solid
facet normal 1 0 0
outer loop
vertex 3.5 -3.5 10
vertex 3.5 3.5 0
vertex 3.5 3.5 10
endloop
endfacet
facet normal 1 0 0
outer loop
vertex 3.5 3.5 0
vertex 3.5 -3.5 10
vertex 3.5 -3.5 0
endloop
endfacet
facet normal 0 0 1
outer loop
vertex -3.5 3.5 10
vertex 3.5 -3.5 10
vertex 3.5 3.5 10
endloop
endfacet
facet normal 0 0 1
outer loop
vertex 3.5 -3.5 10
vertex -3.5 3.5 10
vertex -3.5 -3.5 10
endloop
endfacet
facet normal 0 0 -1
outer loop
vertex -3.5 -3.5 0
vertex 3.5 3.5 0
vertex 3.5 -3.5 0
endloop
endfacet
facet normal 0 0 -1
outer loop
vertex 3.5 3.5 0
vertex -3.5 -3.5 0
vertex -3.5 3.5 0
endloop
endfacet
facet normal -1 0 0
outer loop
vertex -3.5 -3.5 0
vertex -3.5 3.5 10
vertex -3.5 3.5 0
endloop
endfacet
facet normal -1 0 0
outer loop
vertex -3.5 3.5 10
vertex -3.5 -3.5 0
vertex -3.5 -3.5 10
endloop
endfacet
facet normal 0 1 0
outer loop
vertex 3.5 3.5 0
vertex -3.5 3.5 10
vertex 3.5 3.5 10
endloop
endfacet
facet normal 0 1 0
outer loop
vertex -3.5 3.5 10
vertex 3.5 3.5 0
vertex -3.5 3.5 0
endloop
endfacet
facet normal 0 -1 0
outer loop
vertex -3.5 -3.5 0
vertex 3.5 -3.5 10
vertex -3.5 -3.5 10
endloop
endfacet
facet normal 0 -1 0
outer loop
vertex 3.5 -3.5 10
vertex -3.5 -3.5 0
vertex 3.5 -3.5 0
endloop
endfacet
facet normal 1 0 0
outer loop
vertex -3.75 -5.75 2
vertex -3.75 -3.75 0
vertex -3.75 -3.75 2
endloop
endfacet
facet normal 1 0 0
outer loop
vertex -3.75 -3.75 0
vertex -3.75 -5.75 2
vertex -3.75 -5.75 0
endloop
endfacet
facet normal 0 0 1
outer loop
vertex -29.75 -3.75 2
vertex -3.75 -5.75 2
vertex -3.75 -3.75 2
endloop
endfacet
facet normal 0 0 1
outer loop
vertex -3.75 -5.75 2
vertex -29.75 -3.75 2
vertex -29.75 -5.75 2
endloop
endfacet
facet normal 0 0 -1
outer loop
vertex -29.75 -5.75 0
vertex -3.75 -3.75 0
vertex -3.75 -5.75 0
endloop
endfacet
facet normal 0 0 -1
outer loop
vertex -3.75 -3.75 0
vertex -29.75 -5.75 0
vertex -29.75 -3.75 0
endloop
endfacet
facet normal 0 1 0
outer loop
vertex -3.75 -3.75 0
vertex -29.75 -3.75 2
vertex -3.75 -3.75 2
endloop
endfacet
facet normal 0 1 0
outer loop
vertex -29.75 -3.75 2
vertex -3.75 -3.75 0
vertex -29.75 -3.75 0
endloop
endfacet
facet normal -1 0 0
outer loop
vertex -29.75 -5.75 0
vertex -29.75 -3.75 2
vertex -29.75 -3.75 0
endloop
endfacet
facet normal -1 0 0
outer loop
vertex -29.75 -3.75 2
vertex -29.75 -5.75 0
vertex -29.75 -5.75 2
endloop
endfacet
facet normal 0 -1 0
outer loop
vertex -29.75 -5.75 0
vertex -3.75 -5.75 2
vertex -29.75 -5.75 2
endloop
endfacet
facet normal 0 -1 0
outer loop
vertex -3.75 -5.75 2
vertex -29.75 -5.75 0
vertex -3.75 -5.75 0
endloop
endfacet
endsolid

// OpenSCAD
translate([0, 0, 5]) color([0,1,0,0.9]) cube([7, 7, 10], center=true);
translate([-4.0, -4.0, 1]) color([1,0,0]) cube([0.5, 0.5, 2], center=true);
translate([-4.5, -4.0, 1]) color([1,0,0]) cube([0.5, 0.5, 2], center=true);
translate([-5.0, -4.0, 1]) color([1,0,0]) cube([0.5, 0.5, 2], center=true);
translate([-5.5, -4.0, 1]) color([1,0,0]) cube([0.5, 0.5, 2], center=true);
translate([-6.0, -4.0, 1]) color([1,0,0]) cube([0.5, 0.5, 2], center=true);
translate([-6.5, -4.0, 1]) color([1,0,0]) cube([0.5, 0.5, 2], center=true);
translate([-7.0, -4.0, 1]) color([1,0,0]) cube([0.5, 0.5, 2], center=true);
translate([-7.5, -4.0, 1]) color([1,0,0]) cube([0.5, 0.5, 2], center=true);
translate([-8.0, -4.0, 1]) color([1,0,0]) cube([0.5, 0.5, 2], center=true);
translate([-8.5, -4.0, 1]) color([1,0,0]) cube([0.5, 0.5, 2], center=true);
translate([-9.0, -4.0, 1]) color([1,0,0]) cube([0.5, 0.5, 2], center=true);
translate([-9.5, -4.0, 1]) color([1,0,0]) cube([0.5, 0.5, 2], center=true);
translate([-10.0, -4.0, 1]) color([1,0,0]) cube([0.5, 0.5, 2], center=true);
translate([-10.5, -4.0, 1]) color([1,0,0]) cube([0.5, 0.5, 2], center=true);
translate([-11.0, -4.0, 1]) color([1,0,0]) cube([0.5, 0.5, 2], center=true);
translate([-11.5, -4.0, 1]) color([1,0,0]) cube([0.5, 0.5, 2], center=true);
translate([-12.0, -4.0, 1]) color([1,0,0]) cube([0.5, 0.5, 2], center=true);
translate([-12.5, -4.0, 1]) color([1,0,0]) cube([0.5, 0.5, 2], center=true);
translate([-13.0, -4.0, 1]) color([1,0,0]) cube([0.5, 0.5, 2], center=true);
translate([-13.5, -4.0, 1]) color([1,0,0]) cube([0.5, 0.5, 2], center=true);
translate([-14.0, -4.0, 1]) color([1,0,0]) cube([0.5, 0.5, 2], center=true);
translate([-14.5, -4.0, 1]) color([1,0,0]) cube([0.5, 0.5, 2], center=true);
translate([-15.0, -4.0, 1]) color([1,0,0]) cube([0.5, 0.5, 2], center=true);
translate([-15.5, -4.0, 1]) color([1,0,0]) cube([0.5, 0.5, 2], center=true);
translate([-16.0, -4.0, 1]) color([1,0,0]) cube([0.5, 0.5, 2], center=true);
translate([-16.5, -4.0, 1]) color([1,0,0]) cube([0.5, 0.5, 2], center=true);
translate([-17.0, -4.0, 1]) color([1,0,0]) cube([0.5, 0.5, 2], center=true);
translate([-17.5, -4.0, 1]) color([1,0,0]) cube([0.5, 0.5, 2], center=true);
translate([-18.0, -4.0, 1]) color([1,0,0]) cube([0.5, 0.5, 2], center=true);
translate([-18.5, -4.0, 1]) color([1,0,0]) cube([0.5, 0.5, 2], center=true);
translate([-19.0, -4.0, 1]) color([1,0,0]) cube([0.5, 0.5, 2], center=true);
translate([-19.5, -4.0, 1]) color([1,0,0]) cube([0.5, 0.5, 2], center=true);
translate([-20.0, -4.0, 1]) color([1,0,0]) cube([0.5, 0.5, 2], center=true);
translate([-20.5, -4.0, 1]) color([1,0,0]) cube([0.5, 0.5, 2], center=true);
translate([-21.0, -4.0, 1]) color([1,0,0]) cube([0.5, 0.5, 2], center=true);
translate([-21.5, -4.0, 1]) color([1,0,0]) cube([0.5, 0.5, 2], center=true);
translate([-22.0, -4.0, 1]) color([1,0,0]) cube([0.5, 0.5, 2], center=true);
translate([-22.5, -4.0, 1]) color([1,0,0]) cube([0.5, 0.5, 2], center=true);
translate([-23.0, -4.0, 1]) color([1,0,0]) cube([0.5, 0.5, 2], center=true);
translate([-23.5, -4.0, 1]) color([1,0,0]) cube([0.5, 0.5, 2], center=true);
translate([-24.0, -4.0, 1]) color([1,0,0]) cube([0.5, 0.5, 2], center=true);
translate([-24.5, -4.0, 1]) color([1,0,0]) cube([0.5, 0.5, 2], center=true);
translate([-25.0, -4.0, 1]) color([1,0,0]) cube([0.5, 0.5, 2], center=true);
translate([-25.5, -4.0, 1]) color([1,0,0]) cube([0.5, 0.5, 2], center=true);
translate([-26.0, -4.0, 1]) color([1,0,0]) cube([0.5, 0.5, 2], center=true);
translate([-26.5, -4.0, 1]) color([1,0,0]) cube([0.5, 0.5, 2], center=true);
translate([-27.0, -4.0, 1]) color([1,0,0]) cube([0.5, 0.5, 2], center=true);
translate([-27.5, -4.0, 1]) color([1,0,0]) cube([0.5, 0.5, 2], center=true);
translate([-28.0, -4.0, 1]) color([1,0,0]) cube([0.5, 0.5, 2], center=true);
translate([-28.5, -4.0, 1]) color([1,0,0]) cube([0.5, 0.5, 2], center=true);
translate([-29.0, -4.0, 1]) color([1,0,0]) cube([0.5, 0.5, 2], center=true);
translate([-29.5, -4.0, 1]) color([1,0,0]) cube([0.5, 0.5, 2], center=true);
translate([-4.0, -4.5, 1]) color([1,0,0]) cube([0.5, 0.5, 2], center=true);
translate([-4.5, -4.5, 1]) color([1,0,0]) cube([0.5, 0.5, 2], center=true);
translate([-5.0, -4.5, 1]) color([1,0,0]) cube([0.5, 0.5, 2], center=true);
translate([-5.5, -4.5, 1]) color([1,0,0]) cube([0.5, 0.5, 2], center=true);
translate([-6.0, -4.5, 1]) color([1,0,0]) cube([0.5, 0.5, 2], center=true);
translate([-6.5, -4.5, 1]) color([1,0,0]) cube([0.5, 0.5, 2], center=true);
translate([-7.0, -4.5, 1]) color([1,0,0]) cube([0.5, 0.5, 2], center=true);
translate([-7.5, -4.5, 1]) color([1,0,0]) cube([0.5, 0.5, 2], center=true);
translate([-8.0, -4.5, 1]) color([1,0,0]) cube([0.5, 0.5, 2], center=true);
translate([-8.5, -4.5, 1]) color([1,0,0]) cube([0.5, 0.5, 2], center=true);
translate([-9.0, -4.5, 1]) color([1,0,0]) cube([0.5, 0.5, 2], center=true);
translate([-9.5, -4.5, 1]) color([1,0,0]) cube([0.5, 0.5, 2], center=true);
translate([-10.0, -4.5, 1]) color([1,0,0]) cube([0.5, 0.5, 2], center=true);
translate([-10.5, -4.5, 1]) color([1,0,0]) cube([0.5, 0.5, 2], center=true);
translate([-11.0, -4.5, 1]) color([1,0,0]) cube([0.5, 0.5, 2], center=true);
translate([-11.5, -4.5, 1]) color([1,0,0]) cube([0.5, 0.5, 2], center=true);
translate([-12.0, -4.5, 1]) color([1,0,0]) cube([0.5, 0.5, 2], center=true);
translate([-12.5, -4.5, 1]) color([1,0,0]) cube([0.5, 0.5, 2], center=true);
translate([-13.0, -4.5, 1]) color([1,0,0]) cube([0.5, 0.5, 2], center=true);
translate([-13.5, -4.5, 1]) color([1,0,0]) cube([0.5, 0.5, 2], center=true);
translate([-14.0, -4.5, 1]) color([1,0,0]) cube([0.5, 0.5, 2], center=true);
translate([-14.5, -4.5, 1]) color([1,0,0]) cube([0.5, 0.5, 2], center=true);
translate([-15.0, -4.5, 1]) color([1,0,0]) cube([0.5, 0.5, 2], center=true);
translate([-15.5, -4.5, 1]) color([1,0,0]) cube([0.5, 0.5, 2], center=true);
translate([-16.0, -4.5, 1]) color([1,0,0]) cube([0.5, 0.5, 2], center=true);
translate([-16.5, -4.5, 1]) color([1,0,0]) cube([0.5, 0.5, 2], center=true);
translate([-17.0, -4.5, 1]) color([1,0,0]) cube([0.5, 0.5, 2], center=true);
translate([-17.5, -4.5, 1]) color([1,0,0]) cube([0.5, 0.5, 2], center=true);
translate([-18.0, -4.5, 1]) color([1,0,0]) cube([0.5, 0.5, 2], center=true);
translate([-18.5, -4.5, 1]) color([1,0,0]) cube([0.5, 0.5, 2], center=true);
translate([-19.0, -4.5, 1]) color([1,0,0]) cube([0.5, 0.5, 2], center=true);
translate([-19.5, -4.5, 1]) color([1,0,0]) cube([0.5, 0.5, 2], center=true);
translate([-20.0, -4.5, 1]) color([1,0,0]) cube([0.5, 0.5, 2], center=true);
translate([-20.5, -4.5, 1]) color([1,0,0]) cube([0.5, 0.5, 2], center=true);
translate([-21.0, -4.5, 1]) color([1,0,0]) cube([0.5, 0.5, 2], center=true);
translate([-21.5, -4.5, 1]) color([1,0,0]) cube([0.5, 0.5, 2], center=true);
translate([-22.0, -4.5, 1]) color([1,0,0]) cube([0.5, 0.5, 2], center=true);
translate([-22.5, -4.5, 1]) color([1,0,0]) cube([0.5, 0.5, 2], center=true);
translate([-23.0, -4.5, 1]) color([1,0,0]) cube([0.5, 0.5, 2], center=true);
translate([-23.5, -4.5, 1]) color([1,0,0]) cube([0.5, 0.5, 2], center=true);
translate([-24.0, -4.5, 1]) color([1,0,0]) cube([0.5, 0.5, 2], center=true);
translate([-24.5, -4.5, 1]) color([1,0,0]) cube([0.5, 0.5, 2], center=true);
translate([-25.0, -4.5, 1]) color([1,0,0]) cube([0.5, 0.5, 2], center=true);
translate([-25.5, -4.5, 1]) color([1,0,0]) cube([0.5, 0.5, 2], center=true);
translate([-26.0, -4.5, 1]) color([1,0,0]) cube([0.5, 0.5, 2], center=true);
translate([-26.5, -4.5, 1]) color([1,0,0]) cube([0.5, 0.5, 2], center=true);
translate([-27.0, -4.5, 1]) color([1,0,0]) cube([0.5, 0.5, 2], center=true);
translate([-27.5, -4.5, 1]) color([1,0,0]) cube([0.5, 0.5, 2], center=true);
translate([-28.0, -4.5, 1]) color([1,0,0]) cube([0.5, 0.5, 2], center=true);
translate([-28.5, -4.5, 1]) color([1,0,0]) cube([0.5, 0.5, 2], center=true);
translate([-29.0, -4.5, 1]) color([1,0,0]) cube([0.5, 0.5, 2], center=true);
translate([-29.5, -4.5, 1]) color([1,0,0]) cube([0.5, 0.5, 2], center=true);
translate([-4.0, -5.0, 1]) color([1,0,0]) cube([0.5, 0.5, 2], center=true);
translate([-4.5, -5.0, 1]) color([1,0,0]) cube([0.5, 0.5, 2], center=true);
translate([-5.0, -5.0, 1]) color([1,0,0]) cube([0.5, 0.5, 2], center=true);
translate([-5.5, -5.0, 1]) color([1,0,0]) cube([0.5, 0.5, 2], center=true);
translate([-6.0, -5.0, 1]) color([1,0,0]) cube([0.5, 0.5, 2], center=true);
translate([-6.5, -5.0, 1]) color([1,0,0]) cube([0.5, 0.5, 2], center=true);
translate([-7.0, -5.0, 1]) color([1,0,0]) cube([0.5, 0.5, 2], center=true);
translate([-7.5, -5.0, 1]) color([1,0,0]) cube([0.5, 0.5, 2], center=true);
translate([-8.0, -5.0, 1]) color([1,0,0]) cube([0.5, 0.5, 2], center=true);
translate([-8.5, -5.0, 1]) color([1,0,0]) cube([0.5, 0.5, 2], center=true);
translate([-9.0, -5.0, 1]) color([1,0,0]) cube([0.5, 0.5, 2], center=true);
translate([-9.5, -5.0, 1]) color([1,0,0]) cube([0.5, 0.5, 2], center=true);
translate([-10.0, -5.0, 1]) color([1,0,0]) cube([0.5, 0.5, 2], center=true);
translate([-10.5, -5.0, 1]) color([1,0,0]) cube([0.5, 0.5, 2], center=true);
translate([-11.0, -5.0, 1]) color([1,0,0]) cube([0.5, 0.5, 2], center=true);
translate([-11.5, -5.0, 1]) color([1,0,0]) cube([0.5, 0.5, 2], center=true);
translate([-12.0, -5.0, 1]) color([1,0,0]) cube([0.5, 0.5, 2], center=true);
translate([-12.5, -5.0, 1]) color([1,0,0]) cube([0.5, 0.5, 2], center=true);
translate([-13.0, -5.0, 1]) color([1,0,0]) cube([0.5, 0.5, 2], center=true);
translate([-13.5, -5.0, 1]) color([1,0,0]) cube([0.5, 0.5, 2], center=true);
translate([-14.0, -5.0, 1]) color([1,0,0]) cube([0.5, 0.5, 2], center=true);
translate([-14.5, -5.0, 1]) color([1,0,0]) cube([0.5, 0.5, 2], center=true);
translate([-15.0, -5.0, 1]) color([1,0,0]) cube([0.5, 0.5, 2], center=true);
translate([-15.5, -5.0, 1]) color([1,0,0]) cube([0.5, 0.5, 2], center=true);
translate([-16.0, -5.0, 1]) color([1,0,0]) cube([0.5, 0.5, 2], center=true);
translate([-16.5, -5.0, 1]) color([1,0,0]) cube([0.5, 0.5, 2], center=true);
translate([-17.0, -5.0, 1]) color([1,0,0]) cube([0.5, 0.5, 2], center=true);
translate([-17.5, -5.0, 1]) color([1,0,0]) cube([0.5, 0.5, 2], center=true);
translate([-18.0, -5.0, 1]) color([1,0,0]) cube([0.5, 0.5, 2], center=true);
translate([-18.5, -5.0, 1]) color([1,0,0]) cube([0.5, 0.5, 2], center=true);
translate([-19.0, -5.0, 1]) color([1,0,0]) cube([0.5, 0.5, 2], center=true);
translate([-19.5, -5.0, 1]) color([1,0,0]) cube([0.5, 0.5, 2], center=true);
translate([-20.0, -5.0, 1]) color([1,0,0]) cube([0.5, 0.5, 2], center=true);
translate([-20.5, -5.0, 1]) color([1,0,0]) cube([0.5, 0.5, 2], center=true);
translate([-21.0, -5.0, 1]) color([1,0,0]) cube([0.5, 0.5, 2], center=true);
translate([-21.5, -5.0, 1]) color([1,0,0]) cube([0.5, 0.5, 2], center=true);
translate([-22.0, -5.0, 1]) color([1,0,0]) cube([0.5, 0.5, 2], center=true);
translate([-22.5, -5.0, 1]) color([1,0,0]) cube([0.5, 0.5, 2], center=true);
translate([-23.0, -5.0, 1]) color([1,0,0]) cube([0.5, 0.5, 2], center=true);
translate([-23.5, -5.0, 1]) color([1,0,0]) cube([0.5, 0.5, 2], center=true);
translate([-24.0, -5.0, 1]) color([1,0,0]) cube([0.5, 0.5, 2], center=true);
translate([-24.5, -5.0, 1]) color([1,0,0]) cube([0.5, 0.5, 2], center=true);
translate([-25.0, -5.0, 1]) color([1,0,0]) cube([0.5, 0.5, 2], center=true);
translate([-25.5, -5.0, 1]) color([1,0,0]) cube([0.5, 0.5, 2], center=true);
translate([-26.0, -5.0, 1]) color([1,0,0]) cube([0.5, 0.5, 2], center=true);
translate([-26.5, -5.0, 1]) color([1,0,0]) cube([0.5, 0.5, 2], center=true);
translate([-27.0, -5.0, 1]) color([1,0,0]) cube([0.5, 0.5, 2], center=true);
translate([-27.5, -5.0, 1]) color([1,0,0]) cube([0.5, 0.5, 2], center=true);
translate([-28.0, -5.0, 1]) color([1,0,0]) cube([0.5, 0.5, 2], center=true);
translate([-28.5, -5.0, 1]) color([1,0,0]) cube([0.5, 0.5, 2], center=true);
translate([-29.0, -5.0, 1]) color([1,0,0]) cube([0.5, 0.5, 2], center=true);
translate([-29.5, -5.0, 1]) color([1,0,0]) cube([0.5, 0.5, 2], center=true);
translate([-4.0, -5.5, 1]) color([1,0,0]) cube([0.5, 0.5, 2], center=true);
translate([-4.5, -5.5, 1]) color([1,0,0]) cube([0.5, 0.5, 2], center=true);
translate([-5.0, -5.5, 1]) color([1,0,0]) cube([0.5, 0.5, 2], center=true);
translate([-5.5, -5.5, 1]) color([1,0,0]) cube([0.5, 0.5, 2], center=true);
translate([-6.0, -5.5, 1]) color([1,0,0]) cube([0.5, 0.5, 2], center=true);
translate([-6.5, -5.5, 1]) color([1,0,0]) cube([0.5, 0.5, 2], center=true);
translate([-7.0, -5.5, 1]) color([1,0,0]) cube([0.5, 0.5, 2], center=true);
translate([-7.5, -5.5, 1]) color([1,0,0]) cube([0.5, 0.5, 2], center=true);
translate([-8.0, -5.5, 1]) color([1,0,0]) cube([0.5, 0.5, 2], center=true);
translate([-8.5, -5.5, 1]) color([1,0,0]) cube([0.5, 0.5, 2], center=true);
translate([-9.0, -5.5, 1]) color([1,0,0]) cube([0.5, 0.5, 2], center=true);
translate([-9.5, -5.5, 1]) color([1,0,0]) cube([0.5, 0.5, 2], center=true);
translate([-10.0, -5.5, 1]) color([1,0,0]) cube([0.5, 0.5, 2], center=true);
translate([-10.5, -5.5, 1]) color([1,0,0]) cube([0.5, 0.5, 2], center=true);
translate([-11.0, -5.5, 1]) color([1,0,0]) cube([0.5, 0.5, 2], center=true);
translate([-11.5, -5.5, 1]) color([1,0,0]) cube([0.5, 0.5, 2], center=true);
translate([-12.0, -5.5, 1]) color([1,0,0]) cube([0.5, 0.5, 2], center=true);
translate([-12.5, -5.5, 1]) color([1,0,0]) cube([0.5, 0.5, 2], center=true);
translate([-13.0, -5.5, 1]) color([1,0,0]) cube([0.5, 0.5, 2], center=true);
translate([-13.5, -5.5, 1]) color([1,0,0]) cube([0.5, 0.5, 2], center=true);
translate([-14.0, -5.5, 1]) color([1,0,0]) cube([0.5, 0.5, 2], center=true);
translate([-14.5, -5.5, 1]) color([1,0,0]) cube([0.5, 0.5, 2], center=true);
translate([-15.0, -5.5, 1]) color([1,0,0]) cube([0.5, 0.5, 2], center=true);
translate([-15.5, -5.5, 1]) color([1,0,0]) cube([0.5, 0.5, 2], center=true);
translate([-16.0, -5.5, 1]) color([1,0,0]) cube([0.5, 0.5, 2], center=true);
translate([-16.5, -5.5, 1]) color([1,0,0]) cube([0.5, 0.5, 2], center=true);
translate([-17.0, -5.5, 1]) color([1,0,0]) cube([0.5, 0.5, 2], center=true);
translate([-17.5, -5.5, 1]) color([1,0,0]) cube([0.5, 0.5, 2], center=true);
translate([-18.0, -5.5, 1]) color([1,0,0]) cube([0.5, 0.5, 2], center=true);
translate([-18.5, -5.5, 1]) color([1,0,0]) cube([0.5, 0.5, 2], center=true);
translate([-19.0, -5.5, 1]) color([1,0,0]) cube([0.5, 0.5, 2], center=true);
translate([-19.5, -5.5, 1]) color([1,0,0]) cube([0.5, 0.5, 2], center=true);
translate([-20.0, -5.5, 1]) color([1,0,0]) cube([0.5, 0.5, 2], center=true);
translate([-20.5, -5.5, 1]) color([1,0,0]) cube([0.5, 0.5, 2], center=true);
translate([-21.0, -5.5, 1]) color([1,0,0]) cube([0.5, 0.5, 2], center=true);
translate([-21.5, -5.5, 1]) color([1,0,0]) cube([0.5, 0.5, 2], center=true);
translate([-22.0, -5.5, 1]) color([1,0,0]) cube([0.5, 0.5, 2], center=true);
translate([-22.5, -5.5, 1]) color([1,0,0]) cube([0.5, 0.5, 2], center=true);
translate([-23.0, -5.5, 1]) color([1,0,0]) cube([0.5, 0.5, 2], center=true);
translate([-23.5, -5.5, 1]) color([1,0,0]) cube([0.5, 0.5, 2], center=true);
translate([-24.0, -5.5, 1]) color([1,0,0]) cube([0.5, 0.5, 2], center=true);
translate([-24.5, -5.5, 1]) color([1,0,0]) cube([0.5, 0.5, 2], center=true);
translate([-25.0, -5.5, 1]) color([1,0,0]) cube([0.5, 0.5, 2], center=true);
translate([-25.5, -5.5, 1]) color([1,0,0]) cube([0.5, 0.5, 2], center=true);
translate([-26.0, -5.5, 1]) color([1,0,0]) cube([0.5, 0.5, 2], center=true);
translate([-26.5, -5.5, 1]) color([1,0,0]) cube([0.5, 0.5, 2], center=true);
translate([-27.0, -5.5, 1]) color([1,0,0]) cube([0.5, 0.5, 2], center=true);
translate([-27.5, -5.5, 1]) color([1,0,0]) cube([0.5, 0.5, 2], center=true);
translate([-28.0, -5.5, 1]) color([1,0,0]) cube([0.5, 0.5, 2], center=true);
translate([-28.5, -5.5, 1]) color([1,0,0]) cube([0.5, 0.5, 2], center=true);
translate([-29.0, -5.5, 1]) color([1,0,0]) cube([0.5, 0.5, 2], center=true);
translate([-29.5, -5.5, 1]) color([1,0,0]) cube([0.5, 0.5, 2], center=true);
